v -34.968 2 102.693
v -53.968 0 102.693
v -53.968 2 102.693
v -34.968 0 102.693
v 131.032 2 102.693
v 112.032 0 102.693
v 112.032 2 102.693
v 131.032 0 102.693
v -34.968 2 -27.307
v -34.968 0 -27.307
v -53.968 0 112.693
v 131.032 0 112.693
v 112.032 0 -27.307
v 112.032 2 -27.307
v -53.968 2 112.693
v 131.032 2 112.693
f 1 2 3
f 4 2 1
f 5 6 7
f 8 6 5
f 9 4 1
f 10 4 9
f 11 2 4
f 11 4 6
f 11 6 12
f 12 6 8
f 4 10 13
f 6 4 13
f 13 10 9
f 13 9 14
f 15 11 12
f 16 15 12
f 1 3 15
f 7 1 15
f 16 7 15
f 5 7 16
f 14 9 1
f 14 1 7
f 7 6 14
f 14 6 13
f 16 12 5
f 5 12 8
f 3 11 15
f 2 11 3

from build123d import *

# Parameters (mm, degrees)
SKETCH_1_W          = 185
SKETCH_1_H          = 140
EXTRUDE_1_DEPTH     = 2
SKETCH_3_W          = 19
SKETCH_3_H          = 130
CUT_EXTRUDE_3_DEPTH = 173.83842308
SKETCH_4_W          = 19
SKETCH_4_H          = 130
CUT_EXTRUDE_4_DEPTH = 173.83842308


with BuildPart() as part:
    # 草图1 → 凸台-拉伸1 (new body)
    with BuildSketch(Plane(origin=(0, 0, 0), x_dir=(1, 0, 0), z_dir=(0, 1, 0))):
        with Locations((38.532158624, -42.692918585)):
            Rectangle(SKETCH_1_W, SKETCH_1_H)
    extrude(amount=EXTRUDE_1_DEPTH)

    # 草图3 → 切除-拉伸3 (cut, through all)
    with BuildSketch(Plane(origin=(0, 0, 0), x_dir=(1, 0, 0), z_dir=(0, 1, 0))):
        with Locations((-44.467841376, -37.692918585)):
            Rectangle(SKETCH_3_W, SKETCH_3_H)
    extrude(amount=CUT_EXTRUDE_3_DEPTH, mode=Mode.SUBTRACT)

    # 草图4 → 切除-拉伸4 (cut, through all)
    with BuildSketch(Plane(origin=(0, 0, 0), x_dir=(1, 0, 0), z_dir=(0, 1, 0))):
        with Locations((121.532158624, -37.692918585)):
            Rectangle(SKETCH_4_W, SKETCH_4_H)
    extrude(amount=CUT_EXTRUDE_4_DEPTH, mode=Mode.SUBTRACT)


solid = part.part
